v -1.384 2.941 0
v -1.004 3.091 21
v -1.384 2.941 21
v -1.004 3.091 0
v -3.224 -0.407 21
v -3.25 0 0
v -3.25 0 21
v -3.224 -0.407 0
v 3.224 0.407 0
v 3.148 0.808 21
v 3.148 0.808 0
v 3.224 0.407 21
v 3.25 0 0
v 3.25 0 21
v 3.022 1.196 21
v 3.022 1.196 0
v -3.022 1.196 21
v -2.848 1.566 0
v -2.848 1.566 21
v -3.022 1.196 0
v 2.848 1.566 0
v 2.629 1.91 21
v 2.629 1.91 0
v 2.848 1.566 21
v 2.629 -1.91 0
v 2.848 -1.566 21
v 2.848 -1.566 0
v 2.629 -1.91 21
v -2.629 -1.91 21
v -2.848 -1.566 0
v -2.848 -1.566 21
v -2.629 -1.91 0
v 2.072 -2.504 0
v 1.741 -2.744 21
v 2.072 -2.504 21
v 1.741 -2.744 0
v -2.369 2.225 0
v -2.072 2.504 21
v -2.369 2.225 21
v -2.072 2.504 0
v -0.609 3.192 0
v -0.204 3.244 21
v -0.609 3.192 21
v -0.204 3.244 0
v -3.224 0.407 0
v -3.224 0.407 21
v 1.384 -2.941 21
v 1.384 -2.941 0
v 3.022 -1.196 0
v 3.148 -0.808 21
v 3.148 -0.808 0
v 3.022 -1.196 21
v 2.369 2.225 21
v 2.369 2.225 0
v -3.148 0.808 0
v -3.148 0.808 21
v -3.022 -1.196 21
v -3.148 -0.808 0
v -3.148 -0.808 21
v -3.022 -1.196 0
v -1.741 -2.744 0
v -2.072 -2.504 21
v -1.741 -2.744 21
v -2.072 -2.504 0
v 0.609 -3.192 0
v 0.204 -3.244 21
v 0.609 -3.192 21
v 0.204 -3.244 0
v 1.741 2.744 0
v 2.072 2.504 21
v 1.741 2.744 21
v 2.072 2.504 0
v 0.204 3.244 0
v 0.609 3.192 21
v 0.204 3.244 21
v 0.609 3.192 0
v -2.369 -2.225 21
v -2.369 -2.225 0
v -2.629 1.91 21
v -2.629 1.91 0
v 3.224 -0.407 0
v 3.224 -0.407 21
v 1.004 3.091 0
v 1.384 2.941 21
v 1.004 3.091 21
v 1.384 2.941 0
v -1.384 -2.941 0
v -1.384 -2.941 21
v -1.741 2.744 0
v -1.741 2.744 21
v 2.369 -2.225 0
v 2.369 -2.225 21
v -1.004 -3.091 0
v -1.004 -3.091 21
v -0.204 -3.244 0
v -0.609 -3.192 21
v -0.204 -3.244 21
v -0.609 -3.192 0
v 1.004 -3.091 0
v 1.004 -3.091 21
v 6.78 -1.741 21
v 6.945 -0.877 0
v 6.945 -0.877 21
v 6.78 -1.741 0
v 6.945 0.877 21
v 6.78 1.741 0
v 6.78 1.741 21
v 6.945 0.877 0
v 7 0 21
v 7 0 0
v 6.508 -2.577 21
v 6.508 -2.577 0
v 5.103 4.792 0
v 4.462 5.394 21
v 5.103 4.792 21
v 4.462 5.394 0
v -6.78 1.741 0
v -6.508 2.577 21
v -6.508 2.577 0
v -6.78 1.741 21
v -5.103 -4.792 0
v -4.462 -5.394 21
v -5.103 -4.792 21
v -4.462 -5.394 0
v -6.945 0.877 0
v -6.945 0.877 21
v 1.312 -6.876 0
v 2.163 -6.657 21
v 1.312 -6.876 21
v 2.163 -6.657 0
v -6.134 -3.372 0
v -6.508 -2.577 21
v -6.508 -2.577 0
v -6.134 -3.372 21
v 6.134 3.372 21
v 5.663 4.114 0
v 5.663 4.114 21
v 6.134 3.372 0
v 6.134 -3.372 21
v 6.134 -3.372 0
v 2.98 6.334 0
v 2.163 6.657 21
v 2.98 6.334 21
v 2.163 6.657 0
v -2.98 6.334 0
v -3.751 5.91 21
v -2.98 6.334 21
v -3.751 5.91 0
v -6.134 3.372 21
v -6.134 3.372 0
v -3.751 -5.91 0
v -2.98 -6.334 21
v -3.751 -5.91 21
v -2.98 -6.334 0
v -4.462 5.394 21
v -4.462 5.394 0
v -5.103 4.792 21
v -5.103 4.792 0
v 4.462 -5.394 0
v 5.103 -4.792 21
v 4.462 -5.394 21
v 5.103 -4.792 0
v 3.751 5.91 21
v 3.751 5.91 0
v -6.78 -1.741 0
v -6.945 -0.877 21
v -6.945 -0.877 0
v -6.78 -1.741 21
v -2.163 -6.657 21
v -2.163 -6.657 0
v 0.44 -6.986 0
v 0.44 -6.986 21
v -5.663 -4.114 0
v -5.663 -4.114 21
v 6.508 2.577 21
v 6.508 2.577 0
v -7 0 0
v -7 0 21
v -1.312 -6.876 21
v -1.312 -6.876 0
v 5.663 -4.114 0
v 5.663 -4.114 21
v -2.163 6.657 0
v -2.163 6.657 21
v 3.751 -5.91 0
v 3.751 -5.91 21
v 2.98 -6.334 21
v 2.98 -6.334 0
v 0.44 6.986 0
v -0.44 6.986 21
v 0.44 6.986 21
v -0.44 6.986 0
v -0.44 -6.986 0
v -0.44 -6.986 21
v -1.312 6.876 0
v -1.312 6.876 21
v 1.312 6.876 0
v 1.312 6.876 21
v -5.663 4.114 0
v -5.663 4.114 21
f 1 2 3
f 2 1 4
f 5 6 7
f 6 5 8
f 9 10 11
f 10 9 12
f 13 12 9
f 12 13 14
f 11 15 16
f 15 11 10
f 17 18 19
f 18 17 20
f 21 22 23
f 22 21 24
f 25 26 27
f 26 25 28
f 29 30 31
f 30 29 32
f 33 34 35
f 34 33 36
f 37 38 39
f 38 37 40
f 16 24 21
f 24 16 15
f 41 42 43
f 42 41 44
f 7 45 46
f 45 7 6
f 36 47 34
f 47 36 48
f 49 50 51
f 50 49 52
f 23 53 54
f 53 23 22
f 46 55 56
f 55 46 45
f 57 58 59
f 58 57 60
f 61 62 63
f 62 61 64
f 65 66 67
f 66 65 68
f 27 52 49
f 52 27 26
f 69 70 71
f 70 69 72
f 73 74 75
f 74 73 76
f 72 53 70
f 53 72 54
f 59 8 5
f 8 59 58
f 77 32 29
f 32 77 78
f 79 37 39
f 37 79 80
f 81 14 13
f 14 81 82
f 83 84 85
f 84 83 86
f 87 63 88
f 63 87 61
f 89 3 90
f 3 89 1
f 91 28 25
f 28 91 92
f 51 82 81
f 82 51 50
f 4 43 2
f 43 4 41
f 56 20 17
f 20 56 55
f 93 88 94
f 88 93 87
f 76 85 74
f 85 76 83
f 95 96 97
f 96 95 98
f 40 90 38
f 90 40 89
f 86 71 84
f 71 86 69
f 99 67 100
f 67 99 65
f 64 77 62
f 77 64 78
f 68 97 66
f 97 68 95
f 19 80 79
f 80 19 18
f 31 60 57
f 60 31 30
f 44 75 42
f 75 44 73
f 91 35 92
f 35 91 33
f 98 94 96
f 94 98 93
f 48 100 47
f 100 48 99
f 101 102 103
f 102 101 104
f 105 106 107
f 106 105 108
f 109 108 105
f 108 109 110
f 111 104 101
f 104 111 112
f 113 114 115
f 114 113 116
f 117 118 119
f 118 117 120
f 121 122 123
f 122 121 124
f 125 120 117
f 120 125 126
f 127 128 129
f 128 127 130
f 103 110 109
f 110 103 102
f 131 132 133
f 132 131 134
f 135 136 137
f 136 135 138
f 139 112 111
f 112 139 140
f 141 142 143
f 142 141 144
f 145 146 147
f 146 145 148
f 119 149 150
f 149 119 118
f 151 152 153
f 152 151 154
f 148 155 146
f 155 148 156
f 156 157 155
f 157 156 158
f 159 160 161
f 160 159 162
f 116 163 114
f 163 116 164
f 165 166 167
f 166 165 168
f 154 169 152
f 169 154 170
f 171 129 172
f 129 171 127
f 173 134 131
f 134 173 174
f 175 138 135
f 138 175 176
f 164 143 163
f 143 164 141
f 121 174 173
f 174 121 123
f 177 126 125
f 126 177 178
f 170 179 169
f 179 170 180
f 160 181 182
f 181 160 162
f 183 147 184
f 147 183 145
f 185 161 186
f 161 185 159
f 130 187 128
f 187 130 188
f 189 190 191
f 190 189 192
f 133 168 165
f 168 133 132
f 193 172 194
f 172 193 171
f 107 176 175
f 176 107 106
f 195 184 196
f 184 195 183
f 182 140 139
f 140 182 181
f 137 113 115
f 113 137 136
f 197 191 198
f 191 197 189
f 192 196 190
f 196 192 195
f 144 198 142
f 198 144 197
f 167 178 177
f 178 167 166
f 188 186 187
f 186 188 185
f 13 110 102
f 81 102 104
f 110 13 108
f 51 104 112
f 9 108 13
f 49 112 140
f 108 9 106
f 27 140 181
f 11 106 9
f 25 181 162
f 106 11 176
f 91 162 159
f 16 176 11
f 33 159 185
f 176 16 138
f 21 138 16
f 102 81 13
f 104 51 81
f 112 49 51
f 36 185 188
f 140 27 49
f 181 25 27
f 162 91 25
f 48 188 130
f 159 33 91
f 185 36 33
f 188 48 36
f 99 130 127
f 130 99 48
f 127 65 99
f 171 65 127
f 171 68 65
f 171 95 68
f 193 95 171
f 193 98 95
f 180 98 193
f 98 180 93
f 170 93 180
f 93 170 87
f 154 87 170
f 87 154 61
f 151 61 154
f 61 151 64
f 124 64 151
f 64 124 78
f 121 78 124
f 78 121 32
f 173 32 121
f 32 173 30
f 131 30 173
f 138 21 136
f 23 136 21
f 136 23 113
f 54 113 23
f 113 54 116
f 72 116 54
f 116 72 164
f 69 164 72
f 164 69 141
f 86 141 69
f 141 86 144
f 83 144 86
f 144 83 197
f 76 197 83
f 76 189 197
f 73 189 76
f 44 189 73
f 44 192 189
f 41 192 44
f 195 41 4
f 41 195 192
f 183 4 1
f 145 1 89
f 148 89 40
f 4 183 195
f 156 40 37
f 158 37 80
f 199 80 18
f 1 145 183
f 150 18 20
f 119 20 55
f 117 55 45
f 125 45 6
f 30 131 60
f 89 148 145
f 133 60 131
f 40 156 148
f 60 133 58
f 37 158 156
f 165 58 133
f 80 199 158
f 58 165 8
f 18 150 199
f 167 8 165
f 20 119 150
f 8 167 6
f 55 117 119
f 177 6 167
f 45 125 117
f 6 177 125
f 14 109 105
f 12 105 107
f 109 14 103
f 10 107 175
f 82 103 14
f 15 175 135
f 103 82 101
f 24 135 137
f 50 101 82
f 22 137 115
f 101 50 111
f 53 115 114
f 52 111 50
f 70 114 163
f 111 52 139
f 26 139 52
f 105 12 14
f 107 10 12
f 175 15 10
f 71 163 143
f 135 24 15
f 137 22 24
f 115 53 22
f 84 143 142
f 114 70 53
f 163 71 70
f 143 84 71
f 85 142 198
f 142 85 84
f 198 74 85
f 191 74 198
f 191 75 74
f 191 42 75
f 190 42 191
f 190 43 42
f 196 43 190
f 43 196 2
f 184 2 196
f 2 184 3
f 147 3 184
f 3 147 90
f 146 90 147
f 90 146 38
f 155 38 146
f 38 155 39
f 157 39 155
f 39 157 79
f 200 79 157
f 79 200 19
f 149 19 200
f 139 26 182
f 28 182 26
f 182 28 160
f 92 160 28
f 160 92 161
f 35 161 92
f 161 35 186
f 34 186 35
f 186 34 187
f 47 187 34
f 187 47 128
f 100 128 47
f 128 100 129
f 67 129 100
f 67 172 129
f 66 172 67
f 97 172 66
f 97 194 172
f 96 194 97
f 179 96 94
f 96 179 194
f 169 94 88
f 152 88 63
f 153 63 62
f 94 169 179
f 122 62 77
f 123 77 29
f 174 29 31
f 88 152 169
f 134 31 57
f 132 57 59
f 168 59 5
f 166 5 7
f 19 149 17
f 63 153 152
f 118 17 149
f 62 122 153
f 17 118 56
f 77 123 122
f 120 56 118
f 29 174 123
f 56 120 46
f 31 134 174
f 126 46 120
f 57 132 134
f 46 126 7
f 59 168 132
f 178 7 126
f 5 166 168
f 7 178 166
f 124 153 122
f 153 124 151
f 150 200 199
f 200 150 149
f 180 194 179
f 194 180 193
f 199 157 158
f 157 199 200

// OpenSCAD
$fn = 50;


difference() {
	union() {
		cylinder(h = 21, r = 7.0000000000);
	}
	union() {
		translate(v = [0.0000000000, 0.0000000000, -100.0000000000]) {
			cylinder(h = 200, r = 3.2500000000);
		}
		cylinder(h = 21, r = 1.8000000000);
		cylinder(h = 21, r = 1.8000000000);
		cylinder(h = 21, r = 1.8000000000);
	}
}
